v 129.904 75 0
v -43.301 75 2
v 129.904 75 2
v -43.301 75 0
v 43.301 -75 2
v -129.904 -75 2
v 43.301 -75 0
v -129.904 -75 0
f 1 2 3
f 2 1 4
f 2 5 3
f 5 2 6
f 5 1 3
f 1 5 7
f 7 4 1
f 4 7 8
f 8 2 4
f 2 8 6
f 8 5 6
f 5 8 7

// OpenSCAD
tileHeight =  2; // [2:20]
tileWidth = 100;  // [10:300]
border = 0; // [5]
type = "Rhombus"; // [Rhombus,Rhombille Tile]

module tri() {
  translate([tileWidth / 2, 0, 0])
    cylinder(r = tileWidth, h = tileHeight, $fn = 3);
}

module poly() {
  union() {
    translate([0, 0, 0]) {
      tri();
      mirror([1, 0, 0]) tri();
    }
  }
}

module borderedRhombus() {
  rotate([0, 00, 30]) difference() {
    resize([tileWidth, 0, 0], auto = true) poly();
    resize([tileWidth - 2 * border, 0, 0], auto = true) 
      translate([0, 0, tileHeight - 1])  poly();
  }
}

module rhombus() {
  rotate([0, 00, 30]) poly();
}

module tile() {
  offset = sqrt(3) * tileWidth / 2;
  union() {
    color("LemonChiffon")                        translate([0, offset, 0])   poly();
    color("SandyBrown")    rotate([0, 0, 120])   translate([0, offset, 0])   poly();
    color("YellowGreen")   rotate([0, 0, 60])    translate([0, -offset, 0])  poly();
  }
}

if (type == "Rhombille Tile") { tile(); }
else if (border > 0) { borderedRhombus(); }
else { rhombus(); }
